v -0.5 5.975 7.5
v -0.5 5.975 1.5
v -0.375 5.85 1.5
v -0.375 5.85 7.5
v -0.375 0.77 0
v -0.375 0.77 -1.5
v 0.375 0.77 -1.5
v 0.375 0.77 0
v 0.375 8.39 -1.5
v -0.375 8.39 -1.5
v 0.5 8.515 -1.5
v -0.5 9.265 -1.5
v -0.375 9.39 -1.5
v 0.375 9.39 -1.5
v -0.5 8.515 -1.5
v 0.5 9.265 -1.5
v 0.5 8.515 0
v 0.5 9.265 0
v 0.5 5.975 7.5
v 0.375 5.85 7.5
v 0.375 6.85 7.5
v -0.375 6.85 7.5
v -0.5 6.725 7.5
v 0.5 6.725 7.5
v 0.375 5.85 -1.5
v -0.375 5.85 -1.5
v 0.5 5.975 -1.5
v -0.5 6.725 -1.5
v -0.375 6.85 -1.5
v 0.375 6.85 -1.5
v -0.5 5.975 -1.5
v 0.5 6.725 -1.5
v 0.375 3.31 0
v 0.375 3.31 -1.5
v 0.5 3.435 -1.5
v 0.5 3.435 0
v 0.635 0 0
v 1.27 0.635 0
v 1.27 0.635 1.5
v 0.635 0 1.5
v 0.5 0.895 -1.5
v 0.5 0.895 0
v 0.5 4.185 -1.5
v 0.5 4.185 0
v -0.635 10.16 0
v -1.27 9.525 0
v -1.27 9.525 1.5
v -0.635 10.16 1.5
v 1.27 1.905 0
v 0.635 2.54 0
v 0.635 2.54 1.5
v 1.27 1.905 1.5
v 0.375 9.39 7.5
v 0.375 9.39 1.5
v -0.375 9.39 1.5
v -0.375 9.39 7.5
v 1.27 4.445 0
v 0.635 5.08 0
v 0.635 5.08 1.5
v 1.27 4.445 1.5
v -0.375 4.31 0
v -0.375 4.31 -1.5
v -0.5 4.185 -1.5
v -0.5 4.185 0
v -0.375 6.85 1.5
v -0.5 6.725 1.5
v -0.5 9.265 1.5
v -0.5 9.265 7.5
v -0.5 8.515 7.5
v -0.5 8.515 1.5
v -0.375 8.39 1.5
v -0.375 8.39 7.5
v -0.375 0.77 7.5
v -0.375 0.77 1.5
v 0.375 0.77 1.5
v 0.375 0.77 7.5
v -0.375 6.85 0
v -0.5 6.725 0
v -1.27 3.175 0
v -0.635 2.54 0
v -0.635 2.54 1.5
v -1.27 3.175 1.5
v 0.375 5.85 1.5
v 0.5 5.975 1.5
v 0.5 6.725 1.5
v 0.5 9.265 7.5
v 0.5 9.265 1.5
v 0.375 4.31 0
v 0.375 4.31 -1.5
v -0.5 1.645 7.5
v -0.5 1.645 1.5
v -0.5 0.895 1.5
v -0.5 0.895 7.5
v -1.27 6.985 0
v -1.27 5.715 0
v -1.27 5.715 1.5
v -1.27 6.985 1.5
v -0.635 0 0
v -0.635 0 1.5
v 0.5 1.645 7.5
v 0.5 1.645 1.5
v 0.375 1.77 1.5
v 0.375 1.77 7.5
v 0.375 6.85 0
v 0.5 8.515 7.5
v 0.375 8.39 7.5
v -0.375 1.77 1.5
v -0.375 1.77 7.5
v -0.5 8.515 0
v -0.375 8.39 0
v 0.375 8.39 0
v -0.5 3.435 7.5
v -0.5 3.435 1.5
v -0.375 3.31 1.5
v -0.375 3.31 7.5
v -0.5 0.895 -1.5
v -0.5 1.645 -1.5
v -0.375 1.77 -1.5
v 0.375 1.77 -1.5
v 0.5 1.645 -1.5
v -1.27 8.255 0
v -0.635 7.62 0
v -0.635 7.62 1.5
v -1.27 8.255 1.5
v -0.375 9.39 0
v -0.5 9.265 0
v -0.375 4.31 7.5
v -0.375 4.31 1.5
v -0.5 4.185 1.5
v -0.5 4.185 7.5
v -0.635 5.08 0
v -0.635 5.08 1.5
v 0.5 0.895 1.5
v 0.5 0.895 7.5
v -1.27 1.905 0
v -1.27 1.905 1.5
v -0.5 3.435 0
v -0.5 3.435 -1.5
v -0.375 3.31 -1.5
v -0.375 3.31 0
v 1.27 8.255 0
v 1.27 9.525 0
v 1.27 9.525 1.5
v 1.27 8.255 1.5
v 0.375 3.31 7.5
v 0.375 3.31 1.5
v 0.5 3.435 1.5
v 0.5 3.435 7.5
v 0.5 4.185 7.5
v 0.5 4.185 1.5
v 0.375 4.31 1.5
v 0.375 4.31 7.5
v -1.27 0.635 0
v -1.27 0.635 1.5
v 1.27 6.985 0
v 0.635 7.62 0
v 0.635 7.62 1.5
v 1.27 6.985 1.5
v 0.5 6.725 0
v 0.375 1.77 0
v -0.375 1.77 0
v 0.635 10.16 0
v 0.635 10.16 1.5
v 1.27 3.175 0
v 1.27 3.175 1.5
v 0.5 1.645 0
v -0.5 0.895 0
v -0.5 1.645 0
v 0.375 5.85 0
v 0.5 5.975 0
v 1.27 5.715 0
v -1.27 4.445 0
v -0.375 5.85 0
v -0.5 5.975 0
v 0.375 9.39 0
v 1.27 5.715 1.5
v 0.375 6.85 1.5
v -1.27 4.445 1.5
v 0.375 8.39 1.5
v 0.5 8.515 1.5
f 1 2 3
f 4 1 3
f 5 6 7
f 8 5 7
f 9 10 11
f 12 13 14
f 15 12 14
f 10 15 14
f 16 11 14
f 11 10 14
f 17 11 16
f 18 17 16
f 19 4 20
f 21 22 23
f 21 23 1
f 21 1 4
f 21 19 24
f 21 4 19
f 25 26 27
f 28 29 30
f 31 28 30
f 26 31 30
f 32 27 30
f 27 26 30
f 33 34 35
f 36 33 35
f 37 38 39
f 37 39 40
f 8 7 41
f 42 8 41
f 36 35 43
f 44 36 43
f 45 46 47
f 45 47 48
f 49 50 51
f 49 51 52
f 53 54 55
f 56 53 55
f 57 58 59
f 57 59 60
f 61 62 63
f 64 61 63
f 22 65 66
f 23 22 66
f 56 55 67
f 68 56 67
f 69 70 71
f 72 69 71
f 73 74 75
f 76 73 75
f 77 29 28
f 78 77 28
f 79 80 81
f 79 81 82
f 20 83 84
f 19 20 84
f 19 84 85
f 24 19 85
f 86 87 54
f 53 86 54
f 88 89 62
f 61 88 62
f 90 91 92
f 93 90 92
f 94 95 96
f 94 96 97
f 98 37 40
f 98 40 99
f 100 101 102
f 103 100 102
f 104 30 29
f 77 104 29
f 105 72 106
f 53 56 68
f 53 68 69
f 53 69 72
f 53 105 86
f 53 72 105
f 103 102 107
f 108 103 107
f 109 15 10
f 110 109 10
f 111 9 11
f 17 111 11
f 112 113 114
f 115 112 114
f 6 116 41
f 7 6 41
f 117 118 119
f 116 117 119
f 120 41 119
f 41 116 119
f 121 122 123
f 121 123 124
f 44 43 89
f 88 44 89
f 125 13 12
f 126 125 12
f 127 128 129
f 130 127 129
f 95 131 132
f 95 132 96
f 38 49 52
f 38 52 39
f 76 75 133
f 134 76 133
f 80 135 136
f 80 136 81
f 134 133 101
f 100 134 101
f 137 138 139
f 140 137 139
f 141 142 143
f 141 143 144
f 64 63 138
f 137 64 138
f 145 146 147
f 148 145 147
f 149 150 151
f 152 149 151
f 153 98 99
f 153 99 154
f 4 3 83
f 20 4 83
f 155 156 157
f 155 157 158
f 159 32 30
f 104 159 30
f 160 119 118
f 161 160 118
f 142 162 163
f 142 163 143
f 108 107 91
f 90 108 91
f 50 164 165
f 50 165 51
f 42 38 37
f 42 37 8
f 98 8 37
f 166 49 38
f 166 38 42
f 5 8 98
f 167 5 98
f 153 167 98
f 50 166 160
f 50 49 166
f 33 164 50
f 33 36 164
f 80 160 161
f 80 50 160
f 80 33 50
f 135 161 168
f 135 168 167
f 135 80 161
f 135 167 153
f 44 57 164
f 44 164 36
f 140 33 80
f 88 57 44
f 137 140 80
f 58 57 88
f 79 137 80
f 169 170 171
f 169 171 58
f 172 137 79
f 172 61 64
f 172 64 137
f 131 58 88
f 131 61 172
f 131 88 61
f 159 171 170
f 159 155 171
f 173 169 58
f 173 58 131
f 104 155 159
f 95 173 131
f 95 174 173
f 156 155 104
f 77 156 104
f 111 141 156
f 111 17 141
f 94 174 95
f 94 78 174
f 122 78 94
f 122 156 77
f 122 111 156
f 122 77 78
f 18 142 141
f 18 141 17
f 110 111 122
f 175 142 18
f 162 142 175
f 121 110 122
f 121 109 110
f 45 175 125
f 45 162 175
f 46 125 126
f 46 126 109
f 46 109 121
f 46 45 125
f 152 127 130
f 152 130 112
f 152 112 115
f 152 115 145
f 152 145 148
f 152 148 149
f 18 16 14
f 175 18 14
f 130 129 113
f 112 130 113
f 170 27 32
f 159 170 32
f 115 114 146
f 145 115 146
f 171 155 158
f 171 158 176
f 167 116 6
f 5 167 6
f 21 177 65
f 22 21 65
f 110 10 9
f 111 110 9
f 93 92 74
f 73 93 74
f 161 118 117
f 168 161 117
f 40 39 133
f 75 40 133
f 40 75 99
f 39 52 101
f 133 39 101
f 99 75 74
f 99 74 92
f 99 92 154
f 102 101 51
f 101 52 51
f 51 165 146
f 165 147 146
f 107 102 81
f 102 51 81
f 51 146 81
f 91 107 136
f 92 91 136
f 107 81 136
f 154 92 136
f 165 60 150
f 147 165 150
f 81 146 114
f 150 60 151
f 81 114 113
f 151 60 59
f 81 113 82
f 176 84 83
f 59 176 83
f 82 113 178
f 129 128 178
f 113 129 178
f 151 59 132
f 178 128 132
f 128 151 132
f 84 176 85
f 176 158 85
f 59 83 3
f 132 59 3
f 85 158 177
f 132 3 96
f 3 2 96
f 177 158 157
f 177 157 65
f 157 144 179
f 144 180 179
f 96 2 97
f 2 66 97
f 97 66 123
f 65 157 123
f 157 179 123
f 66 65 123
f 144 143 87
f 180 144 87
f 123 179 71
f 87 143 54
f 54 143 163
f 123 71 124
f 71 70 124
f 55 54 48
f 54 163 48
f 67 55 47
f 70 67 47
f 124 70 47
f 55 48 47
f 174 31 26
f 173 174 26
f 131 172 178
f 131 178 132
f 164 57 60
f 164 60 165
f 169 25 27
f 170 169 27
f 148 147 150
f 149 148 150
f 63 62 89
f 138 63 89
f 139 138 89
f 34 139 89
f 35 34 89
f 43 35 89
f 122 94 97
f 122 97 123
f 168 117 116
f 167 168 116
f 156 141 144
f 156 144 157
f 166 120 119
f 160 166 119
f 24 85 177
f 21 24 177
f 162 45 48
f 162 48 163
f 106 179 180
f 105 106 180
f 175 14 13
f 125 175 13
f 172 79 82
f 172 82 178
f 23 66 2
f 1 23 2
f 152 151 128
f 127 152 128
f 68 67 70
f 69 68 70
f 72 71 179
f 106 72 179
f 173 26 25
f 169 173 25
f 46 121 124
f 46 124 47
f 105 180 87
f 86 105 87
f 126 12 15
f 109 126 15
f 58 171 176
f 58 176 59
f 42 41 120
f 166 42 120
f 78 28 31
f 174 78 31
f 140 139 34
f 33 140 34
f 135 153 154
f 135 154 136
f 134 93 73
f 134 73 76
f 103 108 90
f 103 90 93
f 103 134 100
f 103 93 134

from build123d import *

# Parameters (mm, degrees)
BOSS_EXTRUDE1_DEPTH      = 1.5
BOSS_EXTRUDE2_DEPTH      = 6
BOSS_EXTRUDE2_DEPTH_BACK = 3


with BuildPart() as part:
    # Sketch1 → Boss-Extrude1 (new body)
    with BuildSketch(Plane.XY):
        Polygon((-0.635, 10.16), (0.635, 10.16), (1.27, 9.525), (1.27, 8.255), (0.635, 7.62), (1.27, 6.985), (1.27, 5.715), (0.635, 5.08), (1.27, 4.445), (1.27, 3.175), (0.635, 2.54), (1.27, 1.905), (1.27, 0.635), (0.635, 0), (-0.635, 0), (-1.27, 0.635), (-1.27, 1.905), (-0.635, 2.54), (-1.27, 3.175), (-1.27, 4.445), (-0.635, 5.08), (-1.27, 5.715), (-1.27, 6.985), (-0.635, 7.62), (-1.27, 8.255), (-1.27, 9.525), align=None)
    extrude(amount=BOSS_EXTRUDE1_DEPTH)

    # Sketch2 → Boss-Extrude2 (add, two sides: drawn at the far end of the back side and taken through both)
    with BuildSketch(Plane.XY.offset(1.5).offset(-BOSS_EXTRUDE2_DEPTH_BACK)):
        Polygon((0.5, 9.265), (0.375, 9.39), (-0.375, 9.39), (-0.5, 9.265), (-0.5, 8.515), (-0.375, 8.39), (0.375, 8.39), (0.5, 8.515), align=None)
        Polygon((0.5, 6.725), (0.375, 6.85), (-0.375, 6.85), (-0.5, 6.725), (-0.5, 5.975), (-0.375, 5.85), (0.375, 5.85), (0.5, 5.975), align=None)
        Polygon((0.5, 4.185), (0.375, 4.31), (-0.375, 4.31), (-0.5, 4.185), (-0.5, 3.435), (-0.375, 3.31), (0.375, 3.31), (0.5, 3.435), align=None)
        Polygon((0.5, 1.645), (0.375, 1.77), (-0.375, 1.77), (-0.5, 1.645), (-0.5, 0.895), (-0.375, 0.77), (0.375, 0.77), (0.5, 0.895), align=None)
    extrude(amount=BOSS_EXTRUDE2_DEPTH + BOSS_EXTRUDE2_DEPTH_BACK)


solid = part.part
